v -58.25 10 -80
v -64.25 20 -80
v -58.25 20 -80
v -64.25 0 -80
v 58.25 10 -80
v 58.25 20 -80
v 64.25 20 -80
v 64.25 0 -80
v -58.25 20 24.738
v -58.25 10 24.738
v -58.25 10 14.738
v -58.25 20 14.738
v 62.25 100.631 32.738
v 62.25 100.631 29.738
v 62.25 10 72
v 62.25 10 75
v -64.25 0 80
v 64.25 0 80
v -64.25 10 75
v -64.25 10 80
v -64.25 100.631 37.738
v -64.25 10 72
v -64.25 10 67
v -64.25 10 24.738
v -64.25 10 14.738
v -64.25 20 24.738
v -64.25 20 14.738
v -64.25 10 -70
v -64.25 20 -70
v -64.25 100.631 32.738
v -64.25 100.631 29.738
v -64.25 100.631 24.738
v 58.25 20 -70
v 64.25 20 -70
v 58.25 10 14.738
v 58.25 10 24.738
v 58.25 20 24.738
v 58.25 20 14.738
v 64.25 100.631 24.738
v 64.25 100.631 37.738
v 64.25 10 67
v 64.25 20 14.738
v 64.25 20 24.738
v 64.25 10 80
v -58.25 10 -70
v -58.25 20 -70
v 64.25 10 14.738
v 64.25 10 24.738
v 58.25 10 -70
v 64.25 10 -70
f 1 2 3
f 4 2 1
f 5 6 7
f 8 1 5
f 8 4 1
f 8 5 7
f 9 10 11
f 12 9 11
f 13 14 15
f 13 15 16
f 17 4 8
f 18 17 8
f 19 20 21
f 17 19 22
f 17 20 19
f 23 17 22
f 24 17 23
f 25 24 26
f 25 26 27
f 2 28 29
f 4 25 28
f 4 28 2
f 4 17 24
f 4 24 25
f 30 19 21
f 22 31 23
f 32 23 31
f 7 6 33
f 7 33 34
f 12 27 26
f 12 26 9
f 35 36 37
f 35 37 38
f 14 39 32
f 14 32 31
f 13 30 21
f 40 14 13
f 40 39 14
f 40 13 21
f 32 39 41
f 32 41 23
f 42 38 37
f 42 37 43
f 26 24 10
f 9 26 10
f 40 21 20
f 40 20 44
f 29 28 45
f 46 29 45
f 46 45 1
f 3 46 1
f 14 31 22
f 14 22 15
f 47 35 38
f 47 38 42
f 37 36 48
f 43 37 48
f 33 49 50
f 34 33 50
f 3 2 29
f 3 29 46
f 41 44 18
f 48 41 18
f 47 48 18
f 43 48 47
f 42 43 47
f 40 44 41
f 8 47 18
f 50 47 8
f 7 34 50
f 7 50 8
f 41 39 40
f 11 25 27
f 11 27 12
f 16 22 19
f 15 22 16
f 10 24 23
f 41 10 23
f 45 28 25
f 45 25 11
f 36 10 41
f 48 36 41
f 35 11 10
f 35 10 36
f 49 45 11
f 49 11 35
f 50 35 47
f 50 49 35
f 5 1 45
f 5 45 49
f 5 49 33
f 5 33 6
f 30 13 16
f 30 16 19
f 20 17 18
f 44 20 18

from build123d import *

# Parameters (mm, degrees)
SKETCH1_W           = 128.5
SKETCH1_H           = 160
BOSS_EXTRUDE1_DEPTH = 10
SKETCH6_W           = 6
SKETCH6_H           = 10
BOSS_EXTRUDE2_DEPTH = 10


with BuildPart() as part:
    # Sketch1 → Boss-Extrude1 (new body)
    with BuildSketch(Plane(origin=(0, 0, 0), x_dir=(1, 0, 0), z_dir=(0, 1, 0))):
        Rectangle(SKETCH1_W, SKETCH1_H)
    extrude(amount=BOSS_EXTRUDE1_DEPTH)

    # Sweep1: sweep along a path in Sketch4
    with BuildLine(Plane(origin=(64.25, 0, 0), x_dir=(0, 0, -1), z_dir=(1, 0, 0))) as sweep1_path:
        Line((-80, 10), (-37.738173826, 100.630778704))
    # Sketch2 → Sweep1 (sweep)
    with BuildSketch(Plane(origin=(0, 10, 0), x_dir=(1, 0, 0), z_dir=(0, 1, 0))):
        Polygon((-64.25, -80), (64.25, -80), (64.25, -67), (-64.25, -67), (-64.25, -72), (62.25, -72), (62.25, -75), (-64.25, -75), align=None)
    sweep(path=sweep1_path.line)

    # Sketch6 → Boss-Extrude2 (add)
    with BuildSketch(Plane(origin=(0, 10, 0), x_dir=(1, 0, 0), z_dir=(0, 1, 0))):
        with Locations((-61.25, 75)):
            Rectangle(SKETCH6_W, SKETCH6_H)
        with Locations((-61.25, -19.738173826)):
            Rectangle(SKETCH6_W, SKETCH6_H)
        with Locations((61.25, 75)):
            Rectangle(SKETCH6_W, SKETCH6_H)
        with Locations((61.25, -19.738173826)):
            Rectangle(SKETCH6_W, SKETCH6_H)
    extrude(amount=BOSS_EXTRUDE2_DEPTH)


solid = part.part
